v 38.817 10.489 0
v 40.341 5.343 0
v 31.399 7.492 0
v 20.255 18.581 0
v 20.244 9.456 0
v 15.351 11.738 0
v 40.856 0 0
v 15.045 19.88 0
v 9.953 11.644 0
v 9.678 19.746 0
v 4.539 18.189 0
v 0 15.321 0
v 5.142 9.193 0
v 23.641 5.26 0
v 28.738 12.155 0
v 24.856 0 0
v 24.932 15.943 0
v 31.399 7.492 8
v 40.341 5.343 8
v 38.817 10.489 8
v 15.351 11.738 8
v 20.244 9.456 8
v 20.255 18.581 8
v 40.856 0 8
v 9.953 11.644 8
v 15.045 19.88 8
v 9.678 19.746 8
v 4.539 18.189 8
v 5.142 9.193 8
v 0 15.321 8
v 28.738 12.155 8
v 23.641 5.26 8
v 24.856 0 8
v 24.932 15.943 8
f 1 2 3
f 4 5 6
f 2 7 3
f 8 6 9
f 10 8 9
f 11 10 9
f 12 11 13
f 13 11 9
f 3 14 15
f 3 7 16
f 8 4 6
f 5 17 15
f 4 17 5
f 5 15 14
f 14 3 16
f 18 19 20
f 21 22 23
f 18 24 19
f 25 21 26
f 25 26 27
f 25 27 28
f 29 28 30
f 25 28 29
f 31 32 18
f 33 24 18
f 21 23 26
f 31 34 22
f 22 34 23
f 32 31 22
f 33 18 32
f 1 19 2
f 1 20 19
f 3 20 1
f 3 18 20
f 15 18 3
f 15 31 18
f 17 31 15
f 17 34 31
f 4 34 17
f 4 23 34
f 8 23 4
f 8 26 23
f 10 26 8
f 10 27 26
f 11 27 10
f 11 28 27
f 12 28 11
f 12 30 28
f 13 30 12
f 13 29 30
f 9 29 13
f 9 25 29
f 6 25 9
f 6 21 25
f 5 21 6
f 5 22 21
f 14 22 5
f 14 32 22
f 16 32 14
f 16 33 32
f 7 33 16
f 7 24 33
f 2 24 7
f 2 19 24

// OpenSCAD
$fn = 32;

// ----------------------------------------------------------------------
// Arc stop: segment, 8 mm thick
// ----------------------------------------------------------------------

// --- parameters (mm) ---
profile_height = 8;       // extrusion height
profile_points = 17;      // points of the closed outline

profile = [[40.856, 0], [40.341, 5.343], [38.817, 10.489], [31.399, 7.492], [28.738, 12.155], [24.932, 15.943], [20.255, 18.581], [15.045, 19.88], [9.678, 19.746], [4.539, 18.189], [0, 15.321], [5.142, 9.193], [9.953, 11.644], [15.351, 11.738], [20.244, 9.456], [23.641, 5.26], [24.856, 0]];  // single closed polygon, 17 points, counter clockwise

// --- the one profile operation ---
linear_extrude(height = profile_height) polygon(points = profile);
